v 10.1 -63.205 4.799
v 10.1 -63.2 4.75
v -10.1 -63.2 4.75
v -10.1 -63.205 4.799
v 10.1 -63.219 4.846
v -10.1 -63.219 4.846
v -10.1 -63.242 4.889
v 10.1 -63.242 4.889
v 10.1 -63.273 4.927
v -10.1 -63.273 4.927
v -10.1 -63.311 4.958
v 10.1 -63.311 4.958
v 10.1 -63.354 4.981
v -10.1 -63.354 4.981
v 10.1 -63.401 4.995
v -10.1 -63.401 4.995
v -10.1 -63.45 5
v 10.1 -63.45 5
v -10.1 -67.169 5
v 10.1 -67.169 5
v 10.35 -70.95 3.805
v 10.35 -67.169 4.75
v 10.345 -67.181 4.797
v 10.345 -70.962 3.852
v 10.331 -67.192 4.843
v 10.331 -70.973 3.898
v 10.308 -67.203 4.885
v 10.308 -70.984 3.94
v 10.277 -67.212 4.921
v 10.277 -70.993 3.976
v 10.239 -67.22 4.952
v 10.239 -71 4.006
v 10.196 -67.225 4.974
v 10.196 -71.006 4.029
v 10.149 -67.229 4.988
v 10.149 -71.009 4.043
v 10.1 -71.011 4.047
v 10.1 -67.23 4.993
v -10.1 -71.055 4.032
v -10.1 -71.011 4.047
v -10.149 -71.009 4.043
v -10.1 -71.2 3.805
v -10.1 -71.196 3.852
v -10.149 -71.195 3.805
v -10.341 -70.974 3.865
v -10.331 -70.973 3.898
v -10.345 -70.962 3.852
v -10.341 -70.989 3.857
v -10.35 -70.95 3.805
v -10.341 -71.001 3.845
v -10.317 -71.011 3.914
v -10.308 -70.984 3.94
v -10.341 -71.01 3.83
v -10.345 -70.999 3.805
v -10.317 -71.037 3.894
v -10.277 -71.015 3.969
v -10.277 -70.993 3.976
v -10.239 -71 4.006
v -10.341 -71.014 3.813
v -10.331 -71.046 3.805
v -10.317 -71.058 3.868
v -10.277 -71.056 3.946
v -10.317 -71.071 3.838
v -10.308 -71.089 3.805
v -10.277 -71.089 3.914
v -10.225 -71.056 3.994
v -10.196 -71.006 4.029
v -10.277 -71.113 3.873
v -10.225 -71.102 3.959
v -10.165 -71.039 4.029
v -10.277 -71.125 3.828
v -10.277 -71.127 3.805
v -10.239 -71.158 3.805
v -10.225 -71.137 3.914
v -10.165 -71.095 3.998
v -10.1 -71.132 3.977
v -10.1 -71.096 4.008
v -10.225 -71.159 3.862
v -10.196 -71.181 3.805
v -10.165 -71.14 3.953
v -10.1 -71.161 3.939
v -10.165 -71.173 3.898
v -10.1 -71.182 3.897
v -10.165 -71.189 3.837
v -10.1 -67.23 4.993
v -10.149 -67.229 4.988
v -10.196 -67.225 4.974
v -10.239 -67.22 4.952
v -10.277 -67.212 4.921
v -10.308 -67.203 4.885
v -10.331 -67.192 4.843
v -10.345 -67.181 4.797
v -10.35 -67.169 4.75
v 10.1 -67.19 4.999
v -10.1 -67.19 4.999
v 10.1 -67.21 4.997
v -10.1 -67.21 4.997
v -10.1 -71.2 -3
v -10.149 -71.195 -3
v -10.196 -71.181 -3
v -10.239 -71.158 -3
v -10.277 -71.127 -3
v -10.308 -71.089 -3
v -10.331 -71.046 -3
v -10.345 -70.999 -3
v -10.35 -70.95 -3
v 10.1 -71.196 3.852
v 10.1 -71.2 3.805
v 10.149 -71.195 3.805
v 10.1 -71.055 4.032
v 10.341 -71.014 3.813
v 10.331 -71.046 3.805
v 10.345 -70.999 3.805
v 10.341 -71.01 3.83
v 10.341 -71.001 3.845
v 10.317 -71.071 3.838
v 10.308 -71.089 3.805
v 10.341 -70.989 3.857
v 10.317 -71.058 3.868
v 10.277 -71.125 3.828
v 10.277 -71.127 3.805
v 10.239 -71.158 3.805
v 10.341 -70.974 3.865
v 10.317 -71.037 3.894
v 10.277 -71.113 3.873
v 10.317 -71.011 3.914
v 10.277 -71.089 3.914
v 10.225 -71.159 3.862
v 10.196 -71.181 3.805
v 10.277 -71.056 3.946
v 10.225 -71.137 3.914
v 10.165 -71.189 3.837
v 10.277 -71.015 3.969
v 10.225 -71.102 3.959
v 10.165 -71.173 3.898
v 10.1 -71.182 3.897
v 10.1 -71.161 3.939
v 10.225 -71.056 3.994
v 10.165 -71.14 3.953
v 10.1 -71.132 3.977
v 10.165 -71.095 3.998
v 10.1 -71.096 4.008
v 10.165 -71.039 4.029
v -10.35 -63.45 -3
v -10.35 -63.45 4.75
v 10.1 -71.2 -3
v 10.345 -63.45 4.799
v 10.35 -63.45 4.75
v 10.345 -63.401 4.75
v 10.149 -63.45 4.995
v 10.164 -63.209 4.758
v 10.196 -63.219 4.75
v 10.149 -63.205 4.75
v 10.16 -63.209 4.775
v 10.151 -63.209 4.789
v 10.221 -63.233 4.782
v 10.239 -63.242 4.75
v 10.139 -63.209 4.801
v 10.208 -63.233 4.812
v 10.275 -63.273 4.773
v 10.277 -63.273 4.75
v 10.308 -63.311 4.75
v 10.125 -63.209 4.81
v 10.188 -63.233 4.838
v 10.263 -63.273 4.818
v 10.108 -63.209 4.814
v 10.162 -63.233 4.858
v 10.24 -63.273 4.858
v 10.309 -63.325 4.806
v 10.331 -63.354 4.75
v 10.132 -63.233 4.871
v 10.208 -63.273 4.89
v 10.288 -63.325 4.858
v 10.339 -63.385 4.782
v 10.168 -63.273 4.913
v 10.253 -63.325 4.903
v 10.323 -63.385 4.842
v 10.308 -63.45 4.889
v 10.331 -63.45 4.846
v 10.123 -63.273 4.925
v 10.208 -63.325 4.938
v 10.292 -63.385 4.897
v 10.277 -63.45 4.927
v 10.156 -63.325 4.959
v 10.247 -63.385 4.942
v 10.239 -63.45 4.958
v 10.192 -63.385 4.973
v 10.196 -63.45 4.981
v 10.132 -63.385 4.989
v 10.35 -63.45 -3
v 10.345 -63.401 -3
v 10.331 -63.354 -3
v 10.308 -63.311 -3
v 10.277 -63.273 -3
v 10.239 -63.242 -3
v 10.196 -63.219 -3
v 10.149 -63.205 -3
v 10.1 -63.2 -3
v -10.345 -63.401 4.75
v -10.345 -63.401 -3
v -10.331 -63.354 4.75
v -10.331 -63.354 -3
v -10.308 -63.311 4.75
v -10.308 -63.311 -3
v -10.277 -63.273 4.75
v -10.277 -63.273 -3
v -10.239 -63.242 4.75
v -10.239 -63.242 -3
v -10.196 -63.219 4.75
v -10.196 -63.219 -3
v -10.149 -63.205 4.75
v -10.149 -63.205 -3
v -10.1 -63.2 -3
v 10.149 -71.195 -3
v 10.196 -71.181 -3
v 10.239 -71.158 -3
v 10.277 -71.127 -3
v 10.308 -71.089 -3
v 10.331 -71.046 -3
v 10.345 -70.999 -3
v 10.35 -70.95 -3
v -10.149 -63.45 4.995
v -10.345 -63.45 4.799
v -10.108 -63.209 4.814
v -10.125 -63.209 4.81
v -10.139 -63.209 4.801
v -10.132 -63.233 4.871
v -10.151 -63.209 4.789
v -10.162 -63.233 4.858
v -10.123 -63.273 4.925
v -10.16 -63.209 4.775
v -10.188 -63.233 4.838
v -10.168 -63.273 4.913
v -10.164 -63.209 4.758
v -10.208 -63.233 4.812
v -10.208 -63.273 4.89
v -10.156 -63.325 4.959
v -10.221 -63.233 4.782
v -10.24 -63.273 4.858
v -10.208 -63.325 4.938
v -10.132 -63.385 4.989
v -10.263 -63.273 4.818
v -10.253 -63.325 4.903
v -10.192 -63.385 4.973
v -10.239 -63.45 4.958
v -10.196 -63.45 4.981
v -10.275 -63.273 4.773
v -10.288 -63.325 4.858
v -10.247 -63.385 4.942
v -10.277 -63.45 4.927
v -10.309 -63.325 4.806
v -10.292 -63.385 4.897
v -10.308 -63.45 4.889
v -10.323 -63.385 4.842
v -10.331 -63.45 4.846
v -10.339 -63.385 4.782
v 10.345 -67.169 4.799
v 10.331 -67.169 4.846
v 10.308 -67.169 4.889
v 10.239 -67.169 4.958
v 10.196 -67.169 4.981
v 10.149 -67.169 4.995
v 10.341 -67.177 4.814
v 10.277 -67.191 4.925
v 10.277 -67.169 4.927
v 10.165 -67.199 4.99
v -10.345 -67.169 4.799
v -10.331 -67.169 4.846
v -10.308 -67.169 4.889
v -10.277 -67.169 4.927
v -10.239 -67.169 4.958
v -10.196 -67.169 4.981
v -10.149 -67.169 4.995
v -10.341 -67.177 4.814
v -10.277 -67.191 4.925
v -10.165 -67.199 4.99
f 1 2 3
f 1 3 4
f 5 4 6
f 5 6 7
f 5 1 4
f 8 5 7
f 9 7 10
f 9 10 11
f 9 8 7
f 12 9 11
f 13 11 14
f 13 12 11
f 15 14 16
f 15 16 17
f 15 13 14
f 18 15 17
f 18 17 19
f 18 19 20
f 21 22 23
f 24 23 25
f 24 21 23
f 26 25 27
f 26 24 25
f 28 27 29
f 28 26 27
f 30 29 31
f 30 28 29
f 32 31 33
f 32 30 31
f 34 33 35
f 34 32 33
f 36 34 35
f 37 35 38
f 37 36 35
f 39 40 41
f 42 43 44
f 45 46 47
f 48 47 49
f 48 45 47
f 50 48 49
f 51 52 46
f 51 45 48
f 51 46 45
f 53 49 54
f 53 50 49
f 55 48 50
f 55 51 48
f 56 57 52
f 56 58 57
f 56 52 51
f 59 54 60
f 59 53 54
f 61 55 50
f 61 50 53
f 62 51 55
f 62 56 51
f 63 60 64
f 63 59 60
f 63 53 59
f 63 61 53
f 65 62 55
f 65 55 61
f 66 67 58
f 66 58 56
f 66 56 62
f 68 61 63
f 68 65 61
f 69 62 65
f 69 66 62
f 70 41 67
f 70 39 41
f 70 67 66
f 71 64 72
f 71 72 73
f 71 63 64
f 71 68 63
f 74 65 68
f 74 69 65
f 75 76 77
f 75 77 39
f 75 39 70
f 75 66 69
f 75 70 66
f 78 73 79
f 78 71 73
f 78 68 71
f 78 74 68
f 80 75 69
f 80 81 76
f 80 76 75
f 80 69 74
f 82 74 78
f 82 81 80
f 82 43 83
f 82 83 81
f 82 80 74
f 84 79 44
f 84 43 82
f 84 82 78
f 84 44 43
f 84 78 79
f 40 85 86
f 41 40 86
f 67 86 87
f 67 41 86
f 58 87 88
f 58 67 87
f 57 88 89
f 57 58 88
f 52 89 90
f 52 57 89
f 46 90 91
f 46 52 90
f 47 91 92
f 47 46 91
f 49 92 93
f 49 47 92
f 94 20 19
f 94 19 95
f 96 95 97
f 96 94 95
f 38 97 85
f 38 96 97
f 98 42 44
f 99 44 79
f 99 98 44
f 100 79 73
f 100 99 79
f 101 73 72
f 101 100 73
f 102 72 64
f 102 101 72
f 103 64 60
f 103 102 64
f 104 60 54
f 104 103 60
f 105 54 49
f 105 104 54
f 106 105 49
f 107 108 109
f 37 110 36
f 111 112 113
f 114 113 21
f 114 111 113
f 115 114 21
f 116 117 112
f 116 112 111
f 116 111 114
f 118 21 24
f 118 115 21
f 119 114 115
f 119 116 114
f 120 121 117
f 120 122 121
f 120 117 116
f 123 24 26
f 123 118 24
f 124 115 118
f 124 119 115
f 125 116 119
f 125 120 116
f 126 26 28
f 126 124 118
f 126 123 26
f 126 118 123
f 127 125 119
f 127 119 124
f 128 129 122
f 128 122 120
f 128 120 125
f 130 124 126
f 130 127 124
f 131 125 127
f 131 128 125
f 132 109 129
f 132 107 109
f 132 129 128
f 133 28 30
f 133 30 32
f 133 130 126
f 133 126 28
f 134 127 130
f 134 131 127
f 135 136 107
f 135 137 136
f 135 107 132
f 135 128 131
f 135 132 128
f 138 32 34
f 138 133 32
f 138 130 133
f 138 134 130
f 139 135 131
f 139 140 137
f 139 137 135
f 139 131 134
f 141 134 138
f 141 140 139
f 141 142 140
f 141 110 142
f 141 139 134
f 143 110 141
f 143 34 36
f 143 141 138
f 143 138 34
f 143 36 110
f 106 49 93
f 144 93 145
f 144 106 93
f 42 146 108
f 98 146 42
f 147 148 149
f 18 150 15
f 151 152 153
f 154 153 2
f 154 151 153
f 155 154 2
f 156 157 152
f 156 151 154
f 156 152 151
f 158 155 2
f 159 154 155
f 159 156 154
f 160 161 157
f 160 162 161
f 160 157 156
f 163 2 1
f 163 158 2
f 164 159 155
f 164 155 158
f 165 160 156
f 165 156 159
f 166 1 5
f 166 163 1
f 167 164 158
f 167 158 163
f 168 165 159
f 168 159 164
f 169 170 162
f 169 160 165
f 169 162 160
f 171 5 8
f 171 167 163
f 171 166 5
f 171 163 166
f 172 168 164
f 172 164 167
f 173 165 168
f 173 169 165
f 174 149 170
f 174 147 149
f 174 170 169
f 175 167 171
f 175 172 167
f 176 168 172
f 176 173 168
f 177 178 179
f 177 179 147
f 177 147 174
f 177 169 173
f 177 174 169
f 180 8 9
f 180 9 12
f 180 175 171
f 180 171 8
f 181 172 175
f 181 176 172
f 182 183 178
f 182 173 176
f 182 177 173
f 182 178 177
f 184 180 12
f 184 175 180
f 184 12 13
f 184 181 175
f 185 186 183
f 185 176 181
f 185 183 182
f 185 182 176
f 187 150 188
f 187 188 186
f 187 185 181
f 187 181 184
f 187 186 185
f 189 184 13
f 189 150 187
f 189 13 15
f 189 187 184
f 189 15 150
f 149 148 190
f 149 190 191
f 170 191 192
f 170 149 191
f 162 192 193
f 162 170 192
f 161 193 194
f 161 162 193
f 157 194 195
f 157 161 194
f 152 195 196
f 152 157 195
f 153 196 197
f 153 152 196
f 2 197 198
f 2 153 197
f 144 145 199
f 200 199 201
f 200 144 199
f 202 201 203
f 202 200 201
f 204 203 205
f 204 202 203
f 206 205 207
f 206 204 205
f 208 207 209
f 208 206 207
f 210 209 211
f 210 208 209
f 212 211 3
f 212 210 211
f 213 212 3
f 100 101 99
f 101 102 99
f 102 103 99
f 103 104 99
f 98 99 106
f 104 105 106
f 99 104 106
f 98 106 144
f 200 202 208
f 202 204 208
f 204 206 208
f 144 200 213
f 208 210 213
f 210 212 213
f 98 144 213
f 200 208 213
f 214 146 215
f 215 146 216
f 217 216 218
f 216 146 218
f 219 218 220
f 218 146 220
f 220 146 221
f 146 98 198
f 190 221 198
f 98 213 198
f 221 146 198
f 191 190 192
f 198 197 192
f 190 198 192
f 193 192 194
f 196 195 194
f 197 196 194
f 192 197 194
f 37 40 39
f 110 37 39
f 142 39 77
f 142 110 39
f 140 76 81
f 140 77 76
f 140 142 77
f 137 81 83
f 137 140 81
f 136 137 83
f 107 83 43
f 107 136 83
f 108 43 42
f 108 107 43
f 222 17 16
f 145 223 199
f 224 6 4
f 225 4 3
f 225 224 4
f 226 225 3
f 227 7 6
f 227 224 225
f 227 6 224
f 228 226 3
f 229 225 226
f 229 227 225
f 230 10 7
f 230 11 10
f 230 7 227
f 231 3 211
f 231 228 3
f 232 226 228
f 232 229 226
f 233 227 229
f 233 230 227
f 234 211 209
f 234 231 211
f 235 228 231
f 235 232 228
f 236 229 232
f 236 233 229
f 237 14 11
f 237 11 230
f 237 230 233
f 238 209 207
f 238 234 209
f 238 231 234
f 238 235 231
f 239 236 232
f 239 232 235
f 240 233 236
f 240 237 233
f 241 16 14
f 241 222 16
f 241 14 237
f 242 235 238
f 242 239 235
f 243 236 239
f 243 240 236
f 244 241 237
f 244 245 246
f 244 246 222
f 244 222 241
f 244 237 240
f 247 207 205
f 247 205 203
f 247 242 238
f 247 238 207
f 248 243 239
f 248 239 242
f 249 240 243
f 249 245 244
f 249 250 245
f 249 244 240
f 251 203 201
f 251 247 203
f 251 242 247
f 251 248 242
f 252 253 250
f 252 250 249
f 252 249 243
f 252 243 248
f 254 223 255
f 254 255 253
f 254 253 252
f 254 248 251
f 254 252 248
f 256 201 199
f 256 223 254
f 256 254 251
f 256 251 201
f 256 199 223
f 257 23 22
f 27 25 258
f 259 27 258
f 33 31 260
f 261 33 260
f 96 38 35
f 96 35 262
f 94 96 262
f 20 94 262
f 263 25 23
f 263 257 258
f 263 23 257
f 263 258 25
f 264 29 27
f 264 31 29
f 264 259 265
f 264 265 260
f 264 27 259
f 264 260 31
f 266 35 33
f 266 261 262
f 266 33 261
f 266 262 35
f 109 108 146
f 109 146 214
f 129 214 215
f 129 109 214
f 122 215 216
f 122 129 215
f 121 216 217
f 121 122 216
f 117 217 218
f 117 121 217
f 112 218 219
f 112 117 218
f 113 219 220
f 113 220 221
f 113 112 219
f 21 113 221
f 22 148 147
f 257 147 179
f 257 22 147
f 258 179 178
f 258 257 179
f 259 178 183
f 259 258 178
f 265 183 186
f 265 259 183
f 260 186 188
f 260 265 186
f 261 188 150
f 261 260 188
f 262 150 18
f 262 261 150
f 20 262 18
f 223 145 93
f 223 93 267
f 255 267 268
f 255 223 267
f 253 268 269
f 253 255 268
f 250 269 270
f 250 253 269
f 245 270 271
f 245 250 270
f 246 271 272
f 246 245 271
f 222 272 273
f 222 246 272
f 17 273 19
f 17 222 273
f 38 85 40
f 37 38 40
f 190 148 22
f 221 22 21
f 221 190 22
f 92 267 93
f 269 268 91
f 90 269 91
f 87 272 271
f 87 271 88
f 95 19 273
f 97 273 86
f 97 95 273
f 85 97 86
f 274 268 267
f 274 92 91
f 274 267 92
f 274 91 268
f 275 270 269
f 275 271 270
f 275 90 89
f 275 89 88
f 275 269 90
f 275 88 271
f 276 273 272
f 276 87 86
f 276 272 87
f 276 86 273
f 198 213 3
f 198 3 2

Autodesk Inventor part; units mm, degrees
ref_plane "YZ Plane" through (0, 0, 0) normal (1, 0, 0) x (0, 1, 0)
ref_plane "XZ Plane" through (0, 0, 0) normal (0, 1, 0) x (-1, 0, 0)
ref_plane "XY Plane" through (0, 0, 0) normal (0, 0, 1) x (1, 0, 0)
sketch "Szkic1" plane through (0, 0, 0) normal (0, 0, 1) x (1, 0, 0)
  line L0 (10.35, -71.2) -> (-10.35, -71.2)
  line L1 (-10.35, -71.2) -> (-10.35, -63.2)
  line L2 (-10.35, -63.2) -> (10.35, -63.2)
  line L3 (10.35, -63.2) -> (10.35, -71.2)
extrude "Wyciągnięcie proste1" add sketch "Szkic1" along normal blind 5 and the other way blind 3
sketch "Szkic2" plane through (-10.35, -71.2, 5) normal (-1, 0, 0) x (0, 0, 1)
  line L0 (0, 0) -> (0, 4)
  line L1 (0, 4) -> (-1, 0)
  line L2 (0, 0) -> (-1, 0)
  point P0 (-5, 71.2)
extrude "Wyciągnięcie proste2" cut sketch "Szkic2" against normal up to next
fillet "Zaokrąglenie1" radius 0.25 11 edges at (-10.35, -65.2, 5) (-10.35, -69.2, 4.5) (10.35, -69.2, 4.5) (10.35, -65.2, 5) (0, -67.2, 5) (0, -71.2, 4) (-10.35, -71.2, 0.5) (10.35, -71.2, 0.5) (-10.35, -63.2, 1) (0, -63.2, 5) (10.35, -63.2, 1)
properties part number "SPUST" material "Tworzywo sztuczne, nieprzezroczyste czarne"
